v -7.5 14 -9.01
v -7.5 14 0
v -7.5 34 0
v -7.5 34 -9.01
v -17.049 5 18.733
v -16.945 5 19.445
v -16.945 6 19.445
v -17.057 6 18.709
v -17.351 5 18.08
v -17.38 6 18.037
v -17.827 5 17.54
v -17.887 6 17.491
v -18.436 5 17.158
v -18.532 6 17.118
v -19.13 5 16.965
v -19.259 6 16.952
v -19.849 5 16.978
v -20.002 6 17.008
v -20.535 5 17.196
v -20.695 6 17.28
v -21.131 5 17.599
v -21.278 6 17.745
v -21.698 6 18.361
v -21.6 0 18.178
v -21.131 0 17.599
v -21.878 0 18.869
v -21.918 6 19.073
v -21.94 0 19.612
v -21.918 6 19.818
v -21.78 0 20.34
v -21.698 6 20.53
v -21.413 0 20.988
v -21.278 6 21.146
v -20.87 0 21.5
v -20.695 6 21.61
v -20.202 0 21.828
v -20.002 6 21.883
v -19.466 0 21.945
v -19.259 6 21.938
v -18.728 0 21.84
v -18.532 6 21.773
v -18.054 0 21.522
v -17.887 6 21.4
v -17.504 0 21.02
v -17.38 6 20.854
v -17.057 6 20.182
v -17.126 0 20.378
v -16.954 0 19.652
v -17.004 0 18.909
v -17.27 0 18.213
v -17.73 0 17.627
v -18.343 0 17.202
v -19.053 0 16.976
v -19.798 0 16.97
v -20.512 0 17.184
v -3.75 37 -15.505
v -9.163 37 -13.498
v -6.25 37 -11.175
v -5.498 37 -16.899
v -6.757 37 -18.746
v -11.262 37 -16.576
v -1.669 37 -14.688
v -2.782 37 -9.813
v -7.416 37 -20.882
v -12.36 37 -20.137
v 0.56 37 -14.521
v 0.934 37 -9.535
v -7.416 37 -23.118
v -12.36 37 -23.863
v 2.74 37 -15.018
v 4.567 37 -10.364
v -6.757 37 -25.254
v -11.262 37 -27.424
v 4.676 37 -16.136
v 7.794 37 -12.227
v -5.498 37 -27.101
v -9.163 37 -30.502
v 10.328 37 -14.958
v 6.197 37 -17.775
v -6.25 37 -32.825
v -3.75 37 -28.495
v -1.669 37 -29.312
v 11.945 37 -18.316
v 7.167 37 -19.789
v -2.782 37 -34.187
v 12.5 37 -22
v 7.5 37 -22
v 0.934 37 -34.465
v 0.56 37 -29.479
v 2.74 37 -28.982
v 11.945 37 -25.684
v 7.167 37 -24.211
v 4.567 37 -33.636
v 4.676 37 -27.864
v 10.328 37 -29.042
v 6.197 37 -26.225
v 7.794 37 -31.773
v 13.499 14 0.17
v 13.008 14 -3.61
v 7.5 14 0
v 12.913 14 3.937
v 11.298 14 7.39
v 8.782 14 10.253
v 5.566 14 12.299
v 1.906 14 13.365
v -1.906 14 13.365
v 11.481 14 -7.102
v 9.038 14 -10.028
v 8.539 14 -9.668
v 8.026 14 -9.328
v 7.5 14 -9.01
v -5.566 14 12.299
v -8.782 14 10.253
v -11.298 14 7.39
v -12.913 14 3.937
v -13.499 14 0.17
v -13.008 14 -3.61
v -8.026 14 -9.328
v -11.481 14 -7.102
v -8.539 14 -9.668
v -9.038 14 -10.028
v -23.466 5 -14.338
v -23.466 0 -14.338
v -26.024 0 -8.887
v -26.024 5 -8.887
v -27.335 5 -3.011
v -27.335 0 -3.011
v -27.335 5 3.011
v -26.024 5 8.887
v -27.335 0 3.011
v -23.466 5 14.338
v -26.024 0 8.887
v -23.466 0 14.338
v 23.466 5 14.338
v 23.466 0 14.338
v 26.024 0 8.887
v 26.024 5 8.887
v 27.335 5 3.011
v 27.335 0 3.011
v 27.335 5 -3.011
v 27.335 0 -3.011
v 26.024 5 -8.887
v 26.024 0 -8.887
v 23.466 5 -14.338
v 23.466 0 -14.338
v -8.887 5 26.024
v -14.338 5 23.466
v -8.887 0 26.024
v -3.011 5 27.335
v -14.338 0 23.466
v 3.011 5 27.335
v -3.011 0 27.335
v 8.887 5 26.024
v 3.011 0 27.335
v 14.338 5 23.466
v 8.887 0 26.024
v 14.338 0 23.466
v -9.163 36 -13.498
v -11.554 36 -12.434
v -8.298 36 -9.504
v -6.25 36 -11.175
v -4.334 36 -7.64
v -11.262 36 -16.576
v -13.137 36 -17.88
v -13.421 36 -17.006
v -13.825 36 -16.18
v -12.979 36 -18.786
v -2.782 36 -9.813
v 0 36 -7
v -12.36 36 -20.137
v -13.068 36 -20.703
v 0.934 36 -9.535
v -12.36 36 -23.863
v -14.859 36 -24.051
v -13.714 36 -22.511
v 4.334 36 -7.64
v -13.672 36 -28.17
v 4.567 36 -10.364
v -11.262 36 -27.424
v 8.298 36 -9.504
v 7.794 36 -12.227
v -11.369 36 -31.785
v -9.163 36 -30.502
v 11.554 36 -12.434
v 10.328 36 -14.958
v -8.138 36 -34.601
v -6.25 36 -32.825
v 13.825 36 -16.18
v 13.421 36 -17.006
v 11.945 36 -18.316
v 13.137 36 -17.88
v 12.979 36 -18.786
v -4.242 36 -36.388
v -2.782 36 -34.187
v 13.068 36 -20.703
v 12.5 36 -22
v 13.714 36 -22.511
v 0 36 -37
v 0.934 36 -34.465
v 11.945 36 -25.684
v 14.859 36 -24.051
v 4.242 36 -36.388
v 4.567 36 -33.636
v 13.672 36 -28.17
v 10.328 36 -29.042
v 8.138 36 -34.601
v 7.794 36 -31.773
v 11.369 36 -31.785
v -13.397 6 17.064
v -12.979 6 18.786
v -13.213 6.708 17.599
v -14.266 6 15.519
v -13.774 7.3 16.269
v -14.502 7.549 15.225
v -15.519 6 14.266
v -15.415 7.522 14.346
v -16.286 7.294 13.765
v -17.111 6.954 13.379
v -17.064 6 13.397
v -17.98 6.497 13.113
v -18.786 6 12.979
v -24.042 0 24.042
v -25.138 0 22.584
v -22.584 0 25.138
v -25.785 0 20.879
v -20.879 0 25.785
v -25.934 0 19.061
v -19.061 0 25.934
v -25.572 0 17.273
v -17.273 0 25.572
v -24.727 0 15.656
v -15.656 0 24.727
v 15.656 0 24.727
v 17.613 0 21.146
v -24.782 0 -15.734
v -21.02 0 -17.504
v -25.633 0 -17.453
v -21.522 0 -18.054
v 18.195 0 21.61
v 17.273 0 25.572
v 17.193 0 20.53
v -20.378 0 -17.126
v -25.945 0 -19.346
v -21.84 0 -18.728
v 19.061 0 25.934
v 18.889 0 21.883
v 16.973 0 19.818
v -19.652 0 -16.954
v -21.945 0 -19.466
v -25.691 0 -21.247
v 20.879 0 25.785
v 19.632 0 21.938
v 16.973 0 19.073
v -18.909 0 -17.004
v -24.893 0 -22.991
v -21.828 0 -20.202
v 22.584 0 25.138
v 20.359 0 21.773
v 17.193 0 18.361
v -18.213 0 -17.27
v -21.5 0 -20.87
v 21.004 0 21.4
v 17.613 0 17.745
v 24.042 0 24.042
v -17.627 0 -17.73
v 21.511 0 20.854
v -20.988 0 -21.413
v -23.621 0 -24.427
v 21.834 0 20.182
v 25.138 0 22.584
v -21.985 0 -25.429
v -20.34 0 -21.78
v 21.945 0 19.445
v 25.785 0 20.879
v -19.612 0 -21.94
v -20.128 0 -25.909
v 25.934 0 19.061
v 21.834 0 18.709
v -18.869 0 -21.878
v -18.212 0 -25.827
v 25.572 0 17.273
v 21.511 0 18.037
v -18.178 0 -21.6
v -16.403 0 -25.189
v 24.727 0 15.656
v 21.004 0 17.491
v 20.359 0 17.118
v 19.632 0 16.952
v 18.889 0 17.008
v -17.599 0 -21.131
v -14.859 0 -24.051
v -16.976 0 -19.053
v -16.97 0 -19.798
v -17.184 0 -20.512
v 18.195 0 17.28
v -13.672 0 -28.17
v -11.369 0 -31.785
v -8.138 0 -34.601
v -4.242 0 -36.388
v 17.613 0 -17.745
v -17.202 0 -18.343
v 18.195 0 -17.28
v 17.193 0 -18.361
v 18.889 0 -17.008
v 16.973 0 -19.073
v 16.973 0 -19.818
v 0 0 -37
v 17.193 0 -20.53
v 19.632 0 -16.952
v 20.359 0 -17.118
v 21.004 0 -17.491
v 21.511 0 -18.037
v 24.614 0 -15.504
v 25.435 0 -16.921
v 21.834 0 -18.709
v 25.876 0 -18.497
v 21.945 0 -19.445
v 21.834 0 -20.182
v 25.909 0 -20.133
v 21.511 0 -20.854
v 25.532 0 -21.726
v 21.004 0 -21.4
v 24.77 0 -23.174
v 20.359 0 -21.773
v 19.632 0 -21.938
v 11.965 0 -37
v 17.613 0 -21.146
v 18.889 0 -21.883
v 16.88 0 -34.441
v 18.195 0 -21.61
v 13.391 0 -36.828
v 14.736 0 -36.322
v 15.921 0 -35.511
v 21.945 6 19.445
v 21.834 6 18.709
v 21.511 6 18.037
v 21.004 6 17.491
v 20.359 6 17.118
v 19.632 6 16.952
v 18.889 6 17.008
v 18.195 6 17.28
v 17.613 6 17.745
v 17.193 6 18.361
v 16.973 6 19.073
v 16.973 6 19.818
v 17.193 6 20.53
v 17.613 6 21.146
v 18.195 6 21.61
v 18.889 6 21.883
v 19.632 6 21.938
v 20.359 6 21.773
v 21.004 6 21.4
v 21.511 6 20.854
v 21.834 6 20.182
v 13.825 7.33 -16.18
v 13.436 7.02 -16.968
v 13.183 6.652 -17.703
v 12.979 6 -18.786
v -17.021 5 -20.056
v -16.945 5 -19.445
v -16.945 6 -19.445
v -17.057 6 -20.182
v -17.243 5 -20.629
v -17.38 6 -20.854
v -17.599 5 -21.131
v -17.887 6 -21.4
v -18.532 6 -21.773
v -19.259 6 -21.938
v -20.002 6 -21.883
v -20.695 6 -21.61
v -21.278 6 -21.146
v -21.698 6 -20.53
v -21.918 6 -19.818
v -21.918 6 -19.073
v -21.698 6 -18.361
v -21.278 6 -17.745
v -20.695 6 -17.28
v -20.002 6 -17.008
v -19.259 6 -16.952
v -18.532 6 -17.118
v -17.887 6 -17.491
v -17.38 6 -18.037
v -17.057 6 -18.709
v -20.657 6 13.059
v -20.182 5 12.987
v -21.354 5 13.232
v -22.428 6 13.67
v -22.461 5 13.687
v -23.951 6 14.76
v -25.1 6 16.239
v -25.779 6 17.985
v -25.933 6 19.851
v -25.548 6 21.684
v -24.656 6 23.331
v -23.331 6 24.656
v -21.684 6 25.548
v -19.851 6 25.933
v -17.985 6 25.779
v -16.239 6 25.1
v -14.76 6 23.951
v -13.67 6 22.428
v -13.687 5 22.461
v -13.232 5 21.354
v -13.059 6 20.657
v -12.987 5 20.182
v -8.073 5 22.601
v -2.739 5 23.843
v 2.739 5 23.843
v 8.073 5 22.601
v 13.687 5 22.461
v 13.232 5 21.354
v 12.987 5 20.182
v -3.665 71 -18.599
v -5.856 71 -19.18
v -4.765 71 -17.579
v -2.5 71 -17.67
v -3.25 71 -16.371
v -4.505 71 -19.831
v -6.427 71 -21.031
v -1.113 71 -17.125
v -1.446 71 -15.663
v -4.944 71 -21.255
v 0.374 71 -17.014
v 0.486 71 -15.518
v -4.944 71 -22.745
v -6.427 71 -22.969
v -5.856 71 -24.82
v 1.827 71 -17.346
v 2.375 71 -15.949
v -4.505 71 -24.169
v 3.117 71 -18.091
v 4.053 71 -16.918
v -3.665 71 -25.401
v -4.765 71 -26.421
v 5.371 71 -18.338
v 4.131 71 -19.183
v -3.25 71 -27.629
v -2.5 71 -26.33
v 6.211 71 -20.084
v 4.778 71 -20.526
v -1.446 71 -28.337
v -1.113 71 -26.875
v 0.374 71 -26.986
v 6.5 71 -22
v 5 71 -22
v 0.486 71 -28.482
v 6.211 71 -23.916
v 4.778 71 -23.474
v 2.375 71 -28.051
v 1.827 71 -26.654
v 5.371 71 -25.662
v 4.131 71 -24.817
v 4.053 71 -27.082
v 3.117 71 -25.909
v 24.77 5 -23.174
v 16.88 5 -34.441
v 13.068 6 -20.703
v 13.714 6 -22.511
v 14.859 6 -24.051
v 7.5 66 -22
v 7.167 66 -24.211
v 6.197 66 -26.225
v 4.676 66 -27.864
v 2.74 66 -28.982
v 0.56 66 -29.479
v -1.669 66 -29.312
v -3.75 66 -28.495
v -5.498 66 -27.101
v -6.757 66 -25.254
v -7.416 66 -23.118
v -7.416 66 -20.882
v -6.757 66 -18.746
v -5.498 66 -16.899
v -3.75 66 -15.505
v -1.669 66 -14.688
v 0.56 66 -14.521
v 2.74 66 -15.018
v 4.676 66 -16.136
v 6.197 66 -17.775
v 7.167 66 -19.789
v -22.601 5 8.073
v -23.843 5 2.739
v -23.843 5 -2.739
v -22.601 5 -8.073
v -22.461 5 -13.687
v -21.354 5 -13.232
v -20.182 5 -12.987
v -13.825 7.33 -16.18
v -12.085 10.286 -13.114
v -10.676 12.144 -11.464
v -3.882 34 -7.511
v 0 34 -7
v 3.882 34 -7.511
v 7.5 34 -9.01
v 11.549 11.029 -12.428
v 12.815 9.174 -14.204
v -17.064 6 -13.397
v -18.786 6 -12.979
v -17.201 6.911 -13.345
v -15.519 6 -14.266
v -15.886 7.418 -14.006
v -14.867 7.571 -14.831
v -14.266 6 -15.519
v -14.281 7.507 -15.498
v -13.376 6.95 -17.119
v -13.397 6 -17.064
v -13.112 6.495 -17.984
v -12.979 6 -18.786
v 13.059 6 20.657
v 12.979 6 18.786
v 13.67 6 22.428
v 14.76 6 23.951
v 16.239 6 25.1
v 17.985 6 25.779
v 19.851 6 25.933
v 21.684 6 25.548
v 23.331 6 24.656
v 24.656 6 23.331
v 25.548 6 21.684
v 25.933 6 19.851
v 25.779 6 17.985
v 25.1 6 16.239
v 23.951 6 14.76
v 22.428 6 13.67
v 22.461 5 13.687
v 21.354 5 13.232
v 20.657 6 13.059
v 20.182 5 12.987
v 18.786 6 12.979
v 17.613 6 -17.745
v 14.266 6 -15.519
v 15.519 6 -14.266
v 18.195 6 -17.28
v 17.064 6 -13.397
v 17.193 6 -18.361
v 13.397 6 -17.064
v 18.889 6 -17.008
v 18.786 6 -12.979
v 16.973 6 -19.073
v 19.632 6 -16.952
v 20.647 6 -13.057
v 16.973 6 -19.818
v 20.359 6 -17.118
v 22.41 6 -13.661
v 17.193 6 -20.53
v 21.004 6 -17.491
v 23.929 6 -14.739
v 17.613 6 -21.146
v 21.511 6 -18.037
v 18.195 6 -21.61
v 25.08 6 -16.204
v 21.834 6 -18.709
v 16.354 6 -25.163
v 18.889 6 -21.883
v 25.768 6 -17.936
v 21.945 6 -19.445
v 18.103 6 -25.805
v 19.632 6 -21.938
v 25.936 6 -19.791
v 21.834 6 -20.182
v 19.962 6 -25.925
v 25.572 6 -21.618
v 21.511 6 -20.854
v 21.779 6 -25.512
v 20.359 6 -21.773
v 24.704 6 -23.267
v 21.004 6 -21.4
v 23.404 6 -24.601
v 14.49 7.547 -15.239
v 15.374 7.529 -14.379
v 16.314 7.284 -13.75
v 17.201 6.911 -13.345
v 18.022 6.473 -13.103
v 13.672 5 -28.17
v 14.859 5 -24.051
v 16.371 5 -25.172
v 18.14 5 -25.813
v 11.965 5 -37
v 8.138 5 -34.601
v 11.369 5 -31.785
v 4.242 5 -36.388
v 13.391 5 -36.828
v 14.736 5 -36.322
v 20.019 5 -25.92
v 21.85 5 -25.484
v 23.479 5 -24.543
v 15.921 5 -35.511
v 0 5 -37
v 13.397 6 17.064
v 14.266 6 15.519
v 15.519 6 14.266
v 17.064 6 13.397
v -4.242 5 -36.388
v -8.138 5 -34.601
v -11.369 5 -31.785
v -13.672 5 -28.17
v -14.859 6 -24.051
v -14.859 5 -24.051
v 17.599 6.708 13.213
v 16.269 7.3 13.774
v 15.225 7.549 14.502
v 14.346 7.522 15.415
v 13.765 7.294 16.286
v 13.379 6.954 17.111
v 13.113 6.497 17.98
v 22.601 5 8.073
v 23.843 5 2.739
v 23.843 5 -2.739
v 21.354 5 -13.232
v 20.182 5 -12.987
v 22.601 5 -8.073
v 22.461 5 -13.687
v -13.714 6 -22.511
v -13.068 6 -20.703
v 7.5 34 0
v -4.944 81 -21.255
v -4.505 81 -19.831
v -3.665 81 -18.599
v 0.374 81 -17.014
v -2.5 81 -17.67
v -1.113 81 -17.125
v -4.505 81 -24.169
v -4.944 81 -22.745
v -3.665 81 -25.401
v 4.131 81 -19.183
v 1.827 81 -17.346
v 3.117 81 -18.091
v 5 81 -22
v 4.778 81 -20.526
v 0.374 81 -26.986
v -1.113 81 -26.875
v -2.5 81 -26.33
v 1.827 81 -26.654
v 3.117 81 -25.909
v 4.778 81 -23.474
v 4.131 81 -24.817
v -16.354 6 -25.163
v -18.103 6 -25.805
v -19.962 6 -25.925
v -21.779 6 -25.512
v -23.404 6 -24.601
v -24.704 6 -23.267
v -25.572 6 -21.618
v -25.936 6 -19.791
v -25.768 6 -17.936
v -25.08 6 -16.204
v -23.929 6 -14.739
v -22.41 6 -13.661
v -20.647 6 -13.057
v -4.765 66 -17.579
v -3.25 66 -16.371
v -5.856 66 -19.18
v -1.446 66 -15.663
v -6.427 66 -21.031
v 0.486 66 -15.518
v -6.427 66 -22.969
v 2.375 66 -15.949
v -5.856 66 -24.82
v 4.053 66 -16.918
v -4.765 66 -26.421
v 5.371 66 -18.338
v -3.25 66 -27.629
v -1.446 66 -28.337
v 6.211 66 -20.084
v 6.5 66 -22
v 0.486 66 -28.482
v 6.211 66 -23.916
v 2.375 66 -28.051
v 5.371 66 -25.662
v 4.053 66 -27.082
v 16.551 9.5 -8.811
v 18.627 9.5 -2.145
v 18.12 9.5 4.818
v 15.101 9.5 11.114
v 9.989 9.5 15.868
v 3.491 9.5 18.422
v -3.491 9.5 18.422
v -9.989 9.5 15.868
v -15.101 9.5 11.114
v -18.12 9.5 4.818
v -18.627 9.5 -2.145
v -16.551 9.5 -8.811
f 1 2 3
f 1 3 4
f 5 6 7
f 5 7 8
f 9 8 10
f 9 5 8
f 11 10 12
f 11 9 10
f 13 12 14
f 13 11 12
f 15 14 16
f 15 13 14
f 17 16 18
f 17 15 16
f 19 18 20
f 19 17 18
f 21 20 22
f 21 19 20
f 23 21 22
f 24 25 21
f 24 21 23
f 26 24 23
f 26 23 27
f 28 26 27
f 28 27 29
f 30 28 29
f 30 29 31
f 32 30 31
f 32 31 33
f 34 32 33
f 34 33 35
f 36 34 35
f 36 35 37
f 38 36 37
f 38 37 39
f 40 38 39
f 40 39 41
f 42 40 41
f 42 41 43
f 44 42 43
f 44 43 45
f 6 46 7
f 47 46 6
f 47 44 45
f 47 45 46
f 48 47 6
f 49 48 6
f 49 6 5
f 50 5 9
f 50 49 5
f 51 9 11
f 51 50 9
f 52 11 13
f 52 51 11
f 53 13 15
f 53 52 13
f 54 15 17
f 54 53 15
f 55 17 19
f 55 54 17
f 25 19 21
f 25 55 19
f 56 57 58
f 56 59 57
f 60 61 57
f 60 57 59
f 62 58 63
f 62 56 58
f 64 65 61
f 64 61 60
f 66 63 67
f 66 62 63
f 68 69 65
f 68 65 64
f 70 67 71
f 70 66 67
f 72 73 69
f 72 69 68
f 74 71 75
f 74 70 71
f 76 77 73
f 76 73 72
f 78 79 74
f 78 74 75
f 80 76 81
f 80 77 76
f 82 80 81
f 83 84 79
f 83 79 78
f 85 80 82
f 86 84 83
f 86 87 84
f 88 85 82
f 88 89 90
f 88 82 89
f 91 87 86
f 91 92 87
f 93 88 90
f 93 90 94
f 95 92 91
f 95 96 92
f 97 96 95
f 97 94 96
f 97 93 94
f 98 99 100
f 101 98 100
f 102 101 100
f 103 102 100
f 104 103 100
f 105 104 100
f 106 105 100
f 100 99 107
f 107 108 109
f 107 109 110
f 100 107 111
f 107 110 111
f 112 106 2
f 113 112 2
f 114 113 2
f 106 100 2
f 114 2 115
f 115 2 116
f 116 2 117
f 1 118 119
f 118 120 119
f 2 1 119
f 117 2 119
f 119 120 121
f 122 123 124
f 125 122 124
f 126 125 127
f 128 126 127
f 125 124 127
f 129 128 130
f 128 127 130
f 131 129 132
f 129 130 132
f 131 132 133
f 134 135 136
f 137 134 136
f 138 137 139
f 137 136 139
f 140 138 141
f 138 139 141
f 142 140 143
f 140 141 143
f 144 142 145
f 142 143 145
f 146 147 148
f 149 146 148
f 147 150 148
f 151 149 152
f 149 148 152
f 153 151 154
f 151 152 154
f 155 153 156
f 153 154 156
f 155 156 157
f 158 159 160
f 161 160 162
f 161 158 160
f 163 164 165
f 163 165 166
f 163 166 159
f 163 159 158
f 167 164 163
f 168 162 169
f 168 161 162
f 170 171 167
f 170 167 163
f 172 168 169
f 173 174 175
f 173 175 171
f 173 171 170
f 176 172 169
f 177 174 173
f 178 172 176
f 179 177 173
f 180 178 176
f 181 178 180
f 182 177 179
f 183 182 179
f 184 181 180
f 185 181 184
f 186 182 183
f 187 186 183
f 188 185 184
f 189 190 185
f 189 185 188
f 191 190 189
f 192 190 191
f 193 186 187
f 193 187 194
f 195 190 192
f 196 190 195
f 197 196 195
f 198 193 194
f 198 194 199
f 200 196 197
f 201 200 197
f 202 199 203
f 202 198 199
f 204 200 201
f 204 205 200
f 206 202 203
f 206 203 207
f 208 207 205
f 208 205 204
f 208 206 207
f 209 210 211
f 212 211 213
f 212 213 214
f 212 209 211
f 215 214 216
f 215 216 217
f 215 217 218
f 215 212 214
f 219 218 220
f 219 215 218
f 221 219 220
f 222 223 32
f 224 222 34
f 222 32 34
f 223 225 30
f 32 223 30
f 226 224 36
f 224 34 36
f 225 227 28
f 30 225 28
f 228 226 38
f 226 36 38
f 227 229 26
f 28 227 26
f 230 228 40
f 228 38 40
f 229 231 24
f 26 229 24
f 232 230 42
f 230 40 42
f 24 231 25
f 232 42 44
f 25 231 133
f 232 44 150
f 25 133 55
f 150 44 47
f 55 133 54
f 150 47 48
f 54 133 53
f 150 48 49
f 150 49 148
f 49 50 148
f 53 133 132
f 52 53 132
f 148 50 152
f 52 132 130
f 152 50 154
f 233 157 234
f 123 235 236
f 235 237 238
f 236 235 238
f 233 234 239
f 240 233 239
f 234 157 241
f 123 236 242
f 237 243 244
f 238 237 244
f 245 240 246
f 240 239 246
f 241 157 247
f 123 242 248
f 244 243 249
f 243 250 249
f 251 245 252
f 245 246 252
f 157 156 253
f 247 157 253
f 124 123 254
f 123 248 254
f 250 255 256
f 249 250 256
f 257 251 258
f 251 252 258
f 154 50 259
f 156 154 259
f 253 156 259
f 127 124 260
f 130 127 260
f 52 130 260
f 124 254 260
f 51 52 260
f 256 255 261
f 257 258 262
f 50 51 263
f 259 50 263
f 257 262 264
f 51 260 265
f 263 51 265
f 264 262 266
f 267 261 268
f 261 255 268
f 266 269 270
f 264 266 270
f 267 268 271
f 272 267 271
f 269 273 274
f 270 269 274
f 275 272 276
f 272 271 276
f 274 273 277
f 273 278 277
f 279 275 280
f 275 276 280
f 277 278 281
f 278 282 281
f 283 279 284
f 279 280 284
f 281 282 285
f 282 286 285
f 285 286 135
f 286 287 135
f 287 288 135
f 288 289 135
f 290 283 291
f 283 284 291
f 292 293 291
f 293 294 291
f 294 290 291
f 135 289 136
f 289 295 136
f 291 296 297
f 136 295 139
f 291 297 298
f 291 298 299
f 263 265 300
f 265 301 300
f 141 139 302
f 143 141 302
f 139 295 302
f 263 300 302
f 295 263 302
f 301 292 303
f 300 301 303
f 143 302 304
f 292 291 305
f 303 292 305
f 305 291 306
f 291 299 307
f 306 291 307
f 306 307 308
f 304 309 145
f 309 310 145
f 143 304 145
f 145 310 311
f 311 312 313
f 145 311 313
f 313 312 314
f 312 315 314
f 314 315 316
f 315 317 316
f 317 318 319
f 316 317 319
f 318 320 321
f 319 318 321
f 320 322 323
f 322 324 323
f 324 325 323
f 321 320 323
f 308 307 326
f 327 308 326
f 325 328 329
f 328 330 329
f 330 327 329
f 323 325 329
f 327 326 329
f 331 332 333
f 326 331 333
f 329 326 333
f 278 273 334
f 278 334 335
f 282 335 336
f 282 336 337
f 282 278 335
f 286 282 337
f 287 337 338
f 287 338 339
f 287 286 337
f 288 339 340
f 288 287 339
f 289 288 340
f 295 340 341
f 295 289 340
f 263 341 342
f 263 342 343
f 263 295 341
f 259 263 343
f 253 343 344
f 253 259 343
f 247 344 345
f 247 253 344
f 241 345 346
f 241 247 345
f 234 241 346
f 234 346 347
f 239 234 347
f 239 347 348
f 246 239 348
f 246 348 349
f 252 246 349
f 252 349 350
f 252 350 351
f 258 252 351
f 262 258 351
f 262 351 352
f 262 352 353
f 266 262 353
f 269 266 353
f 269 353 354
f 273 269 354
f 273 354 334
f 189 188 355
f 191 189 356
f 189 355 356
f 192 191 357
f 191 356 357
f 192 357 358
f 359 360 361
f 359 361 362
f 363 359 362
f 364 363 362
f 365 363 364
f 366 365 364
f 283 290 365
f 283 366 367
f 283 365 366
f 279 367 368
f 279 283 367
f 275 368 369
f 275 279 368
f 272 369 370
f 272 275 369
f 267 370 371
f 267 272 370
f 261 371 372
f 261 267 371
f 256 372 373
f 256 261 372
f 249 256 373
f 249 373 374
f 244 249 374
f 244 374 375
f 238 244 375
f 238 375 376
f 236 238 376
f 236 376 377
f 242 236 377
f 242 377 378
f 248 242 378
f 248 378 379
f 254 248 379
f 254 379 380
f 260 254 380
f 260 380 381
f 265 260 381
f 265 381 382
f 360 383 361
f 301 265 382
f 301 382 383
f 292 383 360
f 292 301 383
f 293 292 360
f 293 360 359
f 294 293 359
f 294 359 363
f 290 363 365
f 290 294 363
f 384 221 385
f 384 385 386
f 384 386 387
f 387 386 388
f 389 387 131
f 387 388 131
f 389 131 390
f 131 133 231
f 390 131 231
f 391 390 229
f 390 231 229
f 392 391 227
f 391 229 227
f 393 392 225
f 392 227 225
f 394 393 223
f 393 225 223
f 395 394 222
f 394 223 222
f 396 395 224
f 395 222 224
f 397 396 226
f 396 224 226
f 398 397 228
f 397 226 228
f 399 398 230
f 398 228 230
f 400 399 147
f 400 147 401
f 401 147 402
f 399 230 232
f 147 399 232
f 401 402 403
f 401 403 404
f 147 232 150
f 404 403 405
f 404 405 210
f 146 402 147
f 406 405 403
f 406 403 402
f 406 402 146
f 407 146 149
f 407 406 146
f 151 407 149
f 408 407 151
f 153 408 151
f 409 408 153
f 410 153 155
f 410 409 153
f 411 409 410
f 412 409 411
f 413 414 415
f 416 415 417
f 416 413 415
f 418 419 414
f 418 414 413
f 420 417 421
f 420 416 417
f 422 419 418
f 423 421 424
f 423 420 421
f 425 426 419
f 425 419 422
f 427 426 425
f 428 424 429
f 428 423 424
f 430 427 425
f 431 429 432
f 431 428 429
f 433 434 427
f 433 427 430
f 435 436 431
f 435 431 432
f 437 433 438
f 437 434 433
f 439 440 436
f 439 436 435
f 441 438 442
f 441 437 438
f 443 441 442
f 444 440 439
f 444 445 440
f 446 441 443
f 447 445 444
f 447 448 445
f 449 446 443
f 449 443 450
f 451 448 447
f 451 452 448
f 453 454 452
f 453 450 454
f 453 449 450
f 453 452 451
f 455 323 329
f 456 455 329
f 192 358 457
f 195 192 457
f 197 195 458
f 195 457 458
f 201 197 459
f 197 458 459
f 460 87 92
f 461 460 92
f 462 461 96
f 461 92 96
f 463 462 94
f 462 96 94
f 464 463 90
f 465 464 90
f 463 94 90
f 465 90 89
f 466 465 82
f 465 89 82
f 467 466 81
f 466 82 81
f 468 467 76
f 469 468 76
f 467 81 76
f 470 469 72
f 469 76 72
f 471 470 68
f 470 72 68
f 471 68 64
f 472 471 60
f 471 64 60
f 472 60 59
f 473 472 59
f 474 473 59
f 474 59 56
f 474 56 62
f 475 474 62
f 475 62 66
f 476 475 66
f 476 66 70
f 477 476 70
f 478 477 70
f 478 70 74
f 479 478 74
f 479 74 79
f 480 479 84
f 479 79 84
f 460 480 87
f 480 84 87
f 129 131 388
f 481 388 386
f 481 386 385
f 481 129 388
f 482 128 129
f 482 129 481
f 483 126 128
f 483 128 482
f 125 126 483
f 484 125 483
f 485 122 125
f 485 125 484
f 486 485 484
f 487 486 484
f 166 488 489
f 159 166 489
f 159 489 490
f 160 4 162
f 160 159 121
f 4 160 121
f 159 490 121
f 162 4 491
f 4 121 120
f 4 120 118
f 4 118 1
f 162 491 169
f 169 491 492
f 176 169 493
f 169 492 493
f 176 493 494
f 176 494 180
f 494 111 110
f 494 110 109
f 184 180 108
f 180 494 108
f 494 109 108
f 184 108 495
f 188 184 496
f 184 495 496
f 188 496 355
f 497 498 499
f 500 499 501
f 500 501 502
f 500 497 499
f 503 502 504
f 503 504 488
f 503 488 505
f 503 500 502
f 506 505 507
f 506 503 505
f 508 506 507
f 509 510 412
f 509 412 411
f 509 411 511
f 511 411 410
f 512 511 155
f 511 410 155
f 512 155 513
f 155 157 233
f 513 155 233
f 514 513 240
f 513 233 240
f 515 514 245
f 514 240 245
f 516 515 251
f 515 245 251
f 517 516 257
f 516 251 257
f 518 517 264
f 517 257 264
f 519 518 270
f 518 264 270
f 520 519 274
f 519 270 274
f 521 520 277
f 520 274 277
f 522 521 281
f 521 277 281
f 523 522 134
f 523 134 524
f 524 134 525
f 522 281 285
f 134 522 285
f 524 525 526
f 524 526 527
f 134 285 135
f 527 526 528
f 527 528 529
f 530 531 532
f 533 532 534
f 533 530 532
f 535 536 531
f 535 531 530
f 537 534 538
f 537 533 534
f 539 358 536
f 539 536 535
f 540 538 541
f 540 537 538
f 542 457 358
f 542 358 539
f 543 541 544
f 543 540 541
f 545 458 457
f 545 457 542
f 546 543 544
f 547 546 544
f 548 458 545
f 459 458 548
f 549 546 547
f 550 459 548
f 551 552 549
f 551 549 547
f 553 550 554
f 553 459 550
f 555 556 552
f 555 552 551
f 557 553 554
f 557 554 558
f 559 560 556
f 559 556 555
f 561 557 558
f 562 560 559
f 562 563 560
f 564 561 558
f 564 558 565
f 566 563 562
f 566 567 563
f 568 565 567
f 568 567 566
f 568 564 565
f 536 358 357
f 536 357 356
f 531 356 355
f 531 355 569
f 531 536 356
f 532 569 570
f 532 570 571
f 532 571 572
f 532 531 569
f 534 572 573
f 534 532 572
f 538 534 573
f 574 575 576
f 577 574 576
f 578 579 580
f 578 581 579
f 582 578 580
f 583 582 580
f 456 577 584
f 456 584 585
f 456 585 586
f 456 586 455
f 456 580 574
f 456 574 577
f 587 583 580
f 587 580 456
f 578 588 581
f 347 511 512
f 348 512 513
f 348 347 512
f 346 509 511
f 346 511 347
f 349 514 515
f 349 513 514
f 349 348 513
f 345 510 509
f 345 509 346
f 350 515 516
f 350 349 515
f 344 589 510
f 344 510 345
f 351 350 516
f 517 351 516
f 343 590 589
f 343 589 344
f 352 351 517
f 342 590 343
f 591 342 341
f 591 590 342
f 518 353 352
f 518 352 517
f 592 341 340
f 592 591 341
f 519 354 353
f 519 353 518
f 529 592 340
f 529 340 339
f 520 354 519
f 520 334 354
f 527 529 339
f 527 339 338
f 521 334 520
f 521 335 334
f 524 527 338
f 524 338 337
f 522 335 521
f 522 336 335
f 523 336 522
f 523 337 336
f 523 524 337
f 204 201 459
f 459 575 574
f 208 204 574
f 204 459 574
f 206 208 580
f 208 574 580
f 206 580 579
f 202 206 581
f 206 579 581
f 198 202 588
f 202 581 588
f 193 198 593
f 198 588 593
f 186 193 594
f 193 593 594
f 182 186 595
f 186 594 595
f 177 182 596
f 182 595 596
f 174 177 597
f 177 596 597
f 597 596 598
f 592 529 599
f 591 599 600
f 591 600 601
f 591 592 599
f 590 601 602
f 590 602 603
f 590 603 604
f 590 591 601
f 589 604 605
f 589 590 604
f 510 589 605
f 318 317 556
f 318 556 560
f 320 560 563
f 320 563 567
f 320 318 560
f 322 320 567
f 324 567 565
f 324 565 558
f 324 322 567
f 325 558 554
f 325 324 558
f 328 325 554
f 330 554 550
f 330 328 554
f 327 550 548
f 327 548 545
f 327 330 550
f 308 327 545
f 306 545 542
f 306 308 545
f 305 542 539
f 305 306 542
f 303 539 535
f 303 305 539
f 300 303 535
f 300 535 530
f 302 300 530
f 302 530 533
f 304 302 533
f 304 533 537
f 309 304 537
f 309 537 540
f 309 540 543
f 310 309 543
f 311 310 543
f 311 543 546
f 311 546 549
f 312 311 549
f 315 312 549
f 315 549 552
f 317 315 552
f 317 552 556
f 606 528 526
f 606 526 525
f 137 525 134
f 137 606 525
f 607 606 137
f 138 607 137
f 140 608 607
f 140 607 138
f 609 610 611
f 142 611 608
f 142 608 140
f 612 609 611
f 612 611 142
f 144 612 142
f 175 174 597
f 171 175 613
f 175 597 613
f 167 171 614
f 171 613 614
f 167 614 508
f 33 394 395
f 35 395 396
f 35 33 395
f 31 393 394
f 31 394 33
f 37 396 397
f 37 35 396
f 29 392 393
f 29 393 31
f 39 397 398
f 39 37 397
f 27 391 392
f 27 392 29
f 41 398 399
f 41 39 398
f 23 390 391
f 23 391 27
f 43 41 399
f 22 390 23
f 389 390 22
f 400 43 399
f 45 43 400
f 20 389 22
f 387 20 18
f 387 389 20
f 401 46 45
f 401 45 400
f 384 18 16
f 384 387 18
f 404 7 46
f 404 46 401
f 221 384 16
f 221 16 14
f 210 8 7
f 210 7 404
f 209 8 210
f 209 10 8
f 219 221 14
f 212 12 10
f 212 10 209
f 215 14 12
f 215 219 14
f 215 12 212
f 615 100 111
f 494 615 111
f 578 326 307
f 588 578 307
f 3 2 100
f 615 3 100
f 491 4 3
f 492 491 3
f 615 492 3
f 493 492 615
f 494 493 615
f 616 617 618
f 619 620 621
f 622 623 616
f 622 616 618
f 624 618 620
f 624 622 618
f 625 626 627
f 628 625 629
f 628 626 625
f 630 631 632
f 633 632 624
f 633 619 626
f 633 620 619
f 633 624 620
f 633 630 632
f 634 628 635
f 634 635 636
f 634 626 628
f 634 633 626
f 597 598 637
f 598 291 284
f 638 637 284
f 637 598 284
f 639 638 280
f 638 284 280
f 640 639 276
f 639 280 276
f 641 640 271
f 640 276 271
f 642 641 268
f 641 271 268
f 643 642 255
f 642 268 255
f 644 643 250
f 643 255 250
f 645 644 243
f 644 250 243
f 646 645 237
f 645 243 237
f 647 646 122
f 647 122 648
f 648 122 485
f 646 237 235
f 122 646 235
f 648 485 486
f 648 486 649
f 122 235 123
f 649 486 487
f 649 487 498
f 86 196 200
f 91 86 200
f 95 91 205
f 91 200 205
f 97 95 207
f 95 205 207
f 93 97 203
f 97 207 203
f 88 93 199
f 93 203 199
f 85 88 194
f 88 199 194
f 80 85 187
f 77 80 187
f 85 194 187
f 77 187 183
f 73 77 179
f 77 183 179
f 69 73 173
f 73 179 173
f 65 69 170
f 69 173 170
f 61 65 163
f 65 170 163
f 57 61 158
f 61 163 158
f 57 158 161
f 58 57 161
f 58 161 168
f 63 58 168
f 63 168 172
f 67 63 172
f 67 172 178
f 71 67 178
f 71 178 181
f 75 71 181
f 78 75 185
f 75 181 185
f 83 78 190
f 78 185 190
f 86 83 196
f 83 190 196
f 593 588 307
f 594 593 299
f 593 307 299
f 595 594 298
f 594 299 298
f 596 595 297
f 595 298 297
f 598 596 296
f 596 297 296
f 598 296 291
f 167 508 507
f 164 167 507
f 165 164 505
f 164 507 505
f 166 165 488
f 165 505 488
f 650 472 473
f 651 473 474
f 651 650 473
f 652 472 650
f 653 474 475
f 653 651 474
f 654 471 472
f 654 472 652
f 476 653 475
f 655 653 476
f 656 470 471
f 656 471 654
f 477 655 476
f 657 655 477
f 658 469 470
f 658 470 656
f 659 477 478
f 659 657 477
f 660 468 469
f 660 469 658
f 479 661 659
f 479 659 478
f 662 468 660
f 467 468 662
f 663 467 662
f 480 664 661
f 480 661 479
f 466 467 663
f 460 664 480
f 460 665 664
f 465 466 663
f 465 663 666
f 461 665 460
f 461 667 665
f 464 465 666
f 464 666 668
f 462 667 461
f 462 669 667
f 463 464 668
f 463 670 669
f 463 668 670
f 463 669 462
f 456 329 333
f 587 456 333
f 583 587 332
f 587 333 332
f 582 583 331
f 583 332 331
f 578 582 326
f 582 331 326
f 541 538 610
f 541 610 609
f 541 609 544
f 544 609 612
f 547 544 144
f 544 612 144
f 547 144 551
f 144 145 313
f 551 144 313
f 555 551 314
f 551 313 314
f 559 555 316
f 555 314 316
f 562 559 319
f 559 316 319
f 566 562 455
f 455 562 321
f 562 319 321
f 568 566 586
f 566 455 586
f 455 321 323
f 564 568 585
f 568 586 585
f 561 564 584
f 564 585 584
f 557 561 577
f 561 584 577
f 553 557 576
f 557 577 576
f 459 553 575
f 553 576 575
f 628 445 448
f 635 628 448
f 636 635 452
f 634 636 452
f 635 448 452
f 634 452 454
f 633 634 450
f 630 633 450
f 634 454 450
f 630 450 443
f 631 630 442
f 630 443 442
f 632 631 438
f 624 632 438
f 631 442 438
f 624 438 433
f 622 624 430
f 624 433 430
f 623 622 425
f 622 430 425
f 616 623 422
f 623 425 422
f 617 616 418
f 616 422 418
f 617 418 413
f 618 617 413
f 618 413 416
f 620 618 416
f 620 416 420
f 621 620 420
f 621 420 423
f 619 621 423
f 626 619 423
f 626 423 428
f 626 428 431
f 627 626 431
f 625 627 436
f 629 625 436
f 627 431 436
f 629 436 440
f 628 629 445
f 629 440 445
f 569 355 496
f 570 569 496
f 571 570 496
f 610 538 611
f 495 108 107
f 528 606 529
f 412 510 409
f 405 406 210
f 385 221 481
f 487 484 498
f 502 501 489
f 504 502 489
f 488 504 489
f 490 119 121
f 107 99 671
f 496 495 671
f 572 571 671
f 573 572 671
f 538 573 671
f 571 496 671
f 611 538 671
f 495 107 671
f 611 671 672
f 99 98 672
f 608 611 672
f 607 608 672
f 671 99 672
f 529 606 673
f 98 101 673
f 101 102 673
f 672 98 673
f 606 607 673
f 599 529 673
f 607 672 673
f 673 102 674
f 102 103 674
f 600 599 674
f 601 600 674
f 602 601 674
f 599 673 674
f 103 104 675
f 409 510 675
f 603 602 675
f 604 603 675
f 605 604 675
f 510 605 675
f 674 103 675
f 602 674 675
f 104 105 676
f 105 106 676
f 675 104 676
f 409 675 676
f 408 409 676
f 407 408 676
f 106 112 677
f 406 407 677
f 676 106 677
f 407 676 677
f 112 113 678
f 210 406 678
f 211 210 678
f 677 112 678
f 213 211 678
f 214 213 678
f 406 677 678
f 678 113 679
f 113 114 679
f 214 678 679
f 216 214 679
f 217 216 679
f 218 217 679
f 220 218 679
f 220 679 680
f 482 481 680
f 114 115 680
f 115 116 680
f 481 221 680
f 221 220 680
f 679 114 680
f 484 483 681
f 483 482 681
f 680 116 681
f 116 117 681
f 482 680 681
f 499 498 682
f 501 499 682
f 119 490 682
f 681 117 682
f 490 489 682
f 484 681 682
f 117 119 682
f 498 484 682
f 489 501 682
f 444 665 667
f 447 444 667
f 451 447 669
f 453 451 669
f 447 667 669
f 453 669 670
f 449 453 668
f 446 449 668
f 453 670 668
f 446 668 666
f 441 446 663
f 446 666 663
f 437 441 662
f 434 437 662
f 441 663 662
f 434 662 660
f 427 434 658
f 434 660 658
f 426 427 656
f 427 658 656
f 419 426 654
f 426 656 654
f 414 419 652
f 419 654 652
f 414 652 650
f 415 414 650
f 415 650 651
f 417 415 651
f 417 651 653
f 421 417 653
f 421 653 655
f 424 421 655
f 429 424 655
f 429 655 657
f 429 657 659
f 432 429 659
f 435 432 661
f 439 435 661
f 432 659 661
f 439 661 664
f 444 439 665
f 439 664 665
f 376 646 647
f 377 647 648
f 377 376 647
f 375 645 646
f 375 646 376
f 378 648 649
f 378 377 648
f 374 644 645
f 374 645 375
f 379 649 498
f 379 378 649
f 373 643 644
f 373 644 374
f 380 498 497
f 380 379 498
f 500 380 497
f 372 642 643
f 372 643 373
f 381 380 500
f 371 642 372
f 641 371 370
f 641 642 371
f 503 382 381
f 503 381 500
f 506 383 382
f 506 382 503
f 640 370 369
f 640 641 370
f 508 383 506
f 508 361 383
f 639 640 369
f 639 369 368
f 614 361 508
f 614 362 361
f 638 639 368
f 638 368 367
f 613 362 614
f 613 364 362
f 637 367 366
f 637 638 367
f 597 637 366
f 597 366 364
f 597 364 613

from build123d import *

# Parameters (mm, degrees)
SKETCH1_R               = 27.5
BOSS_EXTRUDE1_DEPTH     = 5
SKETCH3_R               = 2.5
CUT_EXTRUDE1_DEPTH      = 6
CUT_EXTRUDE1_DEPTH_BACK = 1
SKETCH3_3_R             = 6.5
SKETCH3_3_R_2           = 2.5
BOSS_EXTRUDE2_DEPTH     = 6
SKETCH5_R               = 6.5
CUT_EXTRUDE2_DEPTH      = 6
BOSS_EXTRUDE3_DEPTH     = 31
SKETCH7_R               = 12.5
BOSS_EXTRUDE4_DEPTH     = 1
SKETCH8_R               = 7.5
BOSS_EXTRUDE5_DEPTH     = 29
SKETCH9_R               = 6.5
BOSS_EXTRUDE6_DEPTH     = 5
SKETCH10_R              = 5
BOSS_EXTRUDE7_DEPTH     = 10
BOSS_EXTRUDE11_DEPTH    = 5
SKETCH13_W              = 15
SKETCH13_H              = 11.899909518
BOSS_EXTRUDE12_DEPTH    = 20


with BuildPart() as part:
    # Sketch1 → Boss-Extrude1 (new body)
    with BuildSketch(Plane(origin=(0, 0, 0), x_dir=(1, 0, 0), z_dir=(0, 1, 0))):
        Circle(SKETCH1_R)
    extrude(amount=BOSS_EXTRUDE1_DEPTH)

    # Sketch3 → Cut-Extrude1 (cut, two sides)
    with BuildSketch(Plane(origin=(0, 0, 0), x_dir=(1, 0, 0), z_dir=(0, 1, 0))) as cut_extrude1_sk:
        with Locations((-19.445436483, -19.445436483)):
            Circle(SKETCH3_R)
        with Locations((-19.445436483, 19.445436483)):
            Circle(SKETCH3_R)
        with Locations((19.445436483, 19.445436483)):
            Circle(SKETCH3_R)
        with Locations((19.445436483, -19.445436483)):
            Circle(SKETCH3_R)
    extrude(amount=CUT_EXTRUDE1_DEPTH, mode=Mode.SUBTRACT)
    extrude(cut_extrude1_sk.sketch, amount=-CUT_EXTRUDE1_DEPTH_BACK, mode=Mode.SUBTRACT)

    # Sketch3<3> → Boss-Extrude2 (add)
    with BuildSketch(Plane(origin=(0, 0, 0), x_dir=(1, 0, 0), z_dir=(0, 1, 0))):
        with Locations((-19.445436483, -19.445436483)):
            Circle(SKETCH3_3_R)
        with Locations((-19.445436483, -19.445436483)):
            Circle(SKETCH3_3_R_2, mode=Mode.SUBTRACT)
        with Locations((-19.445436483, 19.445436483)):
            Circle(SKETCH3_3_R)
        with Locations((-19.445436483, 19.445436483)):
            Circle(SKETCH3_3_R_2, mode=Mode.SUBTRACT)
        with Locations((19.445436483, 19.445436483)):
            Circle(SKETCH3_3_R)
        with Locations((19.445436483, 19.445436483)):
            Circle(SKETCH3_3_R_2, mode=Mode.SUBTRACT)
        with Locations((19.445436483, -19.445436483)):
            Circle(SKETCH3_3_R)
        with Locations((19.445436483, -19.445436483)):
            Circle(SKETCH3_3_R_2, mode=Mode.SUBTRACT)
    extrude(amount=BOSS_EXTRUDE2_DEPTH)

    # Sketch4 → Revolve1 (revolve)
    with BuildSketch(Plane.XY):
        Polygon((0, 5), (-24, 5), (-13.5, 14), (0, 14), align=None)
    revolve(axis=Axis((0, 14, 0), (0, -1, 0)))

    # Sketch5 → Cut-Extrude2 (cut)
    with BuildSketch(Plane(origin=(0, 6, 0), x_dir=(1, 0, 0), z_dir=(0, 1, 0))):
        with Locations((19.445436483, -19.445436483)):
            Circle(SKETCH5_R)
        with Locations((19.445436483, 19.445436483)):
            Circle(SKETCH5_R)
        with Locations((-19.445436483, 19.445436483)):
            Circle(SKETCH5_R)
        with Locations((-19.445436483, -19.445436483)):
            Circle(SKETCH5_R)
    extrude(amount=CUT_EXTRUDE2_DEPTH, mode=Mode.SUBTRACT)

    # Sketch6 → Boss-Extrude3 (add)
    with BuildSketch(Plane(origin=(0, 5, 0), x_dir=(1, 0, 0), z_dir=(0, 1, 0))):
        with BuildLine():
            ThreePointArc((14.859059475, 24.051426706), (0, 37), (-14.859059475, 24.051426706))
            ThreePointArc((-14.859059475, 24.051426706), (-13.323926947, 21.631099084), (-12.9789923, 18.78581566))
            ThreePointArc((-12.9789923, 18.78581566), (-13.26319033, 17.437992209), (-13.825025584, 16.180320661))
            ThreePointArc((-13.825025584, 16.180320661), (0, 7), (13.825025584, 16.180320661))
            ThreePointArc((13.825025584, 16.180320661), (13.26319033, 17.437992209), (12.9789923, 18.78581566))
            ThreePointArc((12.9789923, 18.78581566), (13.323926947, 21.631099084), (14.859059475, 24.051426706))
        make_face()
    extrude(amount=BOSS_EXTRUDE3_DEPTH)

    # Sketch7 → Boss-Extrude4 (add)
    with BuildSketch(Plane(origin=(0, 36, 0), x_dir=(1, 0, 0), z_dir=(0, 1, 0))):
        with Locations((0, 22)):
            Circle(SKETCH7_R)
    extrude(amount=BOSS_EXTRUDE4_DEPTH)

    # Sketch8 → Boss-Extrude5 (add)
    with BuildSketch(Plane(origin=(0, 37, 0), x_dir=(1, 0, 0), z_dir=(0, 1, 0))):
        with Locations((0, 22)):
            Circle(SKETCH8_R)
    extrude(amount=BOSS_EXTRUDE5_DEPTH)

    # Sketch9 → Boss-Extrude6 (add)
    with BuildSketch(Plane(origin=(0, 66, 0), x_dir=(1, 0, 0), z_dir=(0, 1, 0))):
        with Locations((0, 22)):
            Circle(SKETCH9_R)
    extrude(amount=BOSS_EXTRUDE6_DEPTH)

    # Sketch10 → Boss-Extrude7 (add)
    with BuildSketch(Plane(origin=(0, 71, 0), x_dir=(1, 0, 0), z_dir=(0, 1, 0))):
        with Locations((0, 22)):
            Circle(SKETCH10_R)
    extrude(amount=BOSS_EXTRUDE7_DEPTH)

    # Sketch12 → Boss-Extrude11 (add)
    with BuildSketch(Plane(origin=(0, 0, 0), x_dir=(1, 0, 0), z_dir=(0, 1, 0))):
        with BuildLine():
            Line((24.769924771, 23.173683319), (16.880143567, 34.441458618))
            ThreePointArc((16.880143567, 34.441458618), (14.735722981, 36.322064999), (11.965231301, 37))
            Line((11.965231301, 37), (0, 37))
            ThreePointArc((0, 37), (-9.854658782, 33.30865599), (-14.859059475, 24.051426706))
            ThreePointArc((-14.859059475, 24.051426706), (-14.589838885, 23.766683059), (-14.338266086, 23.466233734))
            ThreePointArc((-14.338266086, 23.466233734), (0, 27.5), (14.338266086, 23.466233734))
            ThreePointArc((14.338266086, 23.466233734), (14.589838885, 23.766683059), (14.859059475, 24.051426706))
            ThreePointArc((14.859059475, 24.051426706), (20.018856424, 25.920093969), (24.769924771, 23.173683319))
        make_face()
    extrude(amount=BOSS_EXTRUDE11_DEPTH)

    # Sketch13 → Boss-Extrude12 (add)
    with BuildSketch(Plane(origin=(0, 14, 0), x_dir=(1, 0, 0), z_dir=(0, 1, 0))):
        with Locations((0, 5.949954759)):
            Rectangle(SKETCH13_W, SKETCH13_H)
    extrude(amount=BOSS_EXTRUDE12_DEPTH)


solid = part.part
